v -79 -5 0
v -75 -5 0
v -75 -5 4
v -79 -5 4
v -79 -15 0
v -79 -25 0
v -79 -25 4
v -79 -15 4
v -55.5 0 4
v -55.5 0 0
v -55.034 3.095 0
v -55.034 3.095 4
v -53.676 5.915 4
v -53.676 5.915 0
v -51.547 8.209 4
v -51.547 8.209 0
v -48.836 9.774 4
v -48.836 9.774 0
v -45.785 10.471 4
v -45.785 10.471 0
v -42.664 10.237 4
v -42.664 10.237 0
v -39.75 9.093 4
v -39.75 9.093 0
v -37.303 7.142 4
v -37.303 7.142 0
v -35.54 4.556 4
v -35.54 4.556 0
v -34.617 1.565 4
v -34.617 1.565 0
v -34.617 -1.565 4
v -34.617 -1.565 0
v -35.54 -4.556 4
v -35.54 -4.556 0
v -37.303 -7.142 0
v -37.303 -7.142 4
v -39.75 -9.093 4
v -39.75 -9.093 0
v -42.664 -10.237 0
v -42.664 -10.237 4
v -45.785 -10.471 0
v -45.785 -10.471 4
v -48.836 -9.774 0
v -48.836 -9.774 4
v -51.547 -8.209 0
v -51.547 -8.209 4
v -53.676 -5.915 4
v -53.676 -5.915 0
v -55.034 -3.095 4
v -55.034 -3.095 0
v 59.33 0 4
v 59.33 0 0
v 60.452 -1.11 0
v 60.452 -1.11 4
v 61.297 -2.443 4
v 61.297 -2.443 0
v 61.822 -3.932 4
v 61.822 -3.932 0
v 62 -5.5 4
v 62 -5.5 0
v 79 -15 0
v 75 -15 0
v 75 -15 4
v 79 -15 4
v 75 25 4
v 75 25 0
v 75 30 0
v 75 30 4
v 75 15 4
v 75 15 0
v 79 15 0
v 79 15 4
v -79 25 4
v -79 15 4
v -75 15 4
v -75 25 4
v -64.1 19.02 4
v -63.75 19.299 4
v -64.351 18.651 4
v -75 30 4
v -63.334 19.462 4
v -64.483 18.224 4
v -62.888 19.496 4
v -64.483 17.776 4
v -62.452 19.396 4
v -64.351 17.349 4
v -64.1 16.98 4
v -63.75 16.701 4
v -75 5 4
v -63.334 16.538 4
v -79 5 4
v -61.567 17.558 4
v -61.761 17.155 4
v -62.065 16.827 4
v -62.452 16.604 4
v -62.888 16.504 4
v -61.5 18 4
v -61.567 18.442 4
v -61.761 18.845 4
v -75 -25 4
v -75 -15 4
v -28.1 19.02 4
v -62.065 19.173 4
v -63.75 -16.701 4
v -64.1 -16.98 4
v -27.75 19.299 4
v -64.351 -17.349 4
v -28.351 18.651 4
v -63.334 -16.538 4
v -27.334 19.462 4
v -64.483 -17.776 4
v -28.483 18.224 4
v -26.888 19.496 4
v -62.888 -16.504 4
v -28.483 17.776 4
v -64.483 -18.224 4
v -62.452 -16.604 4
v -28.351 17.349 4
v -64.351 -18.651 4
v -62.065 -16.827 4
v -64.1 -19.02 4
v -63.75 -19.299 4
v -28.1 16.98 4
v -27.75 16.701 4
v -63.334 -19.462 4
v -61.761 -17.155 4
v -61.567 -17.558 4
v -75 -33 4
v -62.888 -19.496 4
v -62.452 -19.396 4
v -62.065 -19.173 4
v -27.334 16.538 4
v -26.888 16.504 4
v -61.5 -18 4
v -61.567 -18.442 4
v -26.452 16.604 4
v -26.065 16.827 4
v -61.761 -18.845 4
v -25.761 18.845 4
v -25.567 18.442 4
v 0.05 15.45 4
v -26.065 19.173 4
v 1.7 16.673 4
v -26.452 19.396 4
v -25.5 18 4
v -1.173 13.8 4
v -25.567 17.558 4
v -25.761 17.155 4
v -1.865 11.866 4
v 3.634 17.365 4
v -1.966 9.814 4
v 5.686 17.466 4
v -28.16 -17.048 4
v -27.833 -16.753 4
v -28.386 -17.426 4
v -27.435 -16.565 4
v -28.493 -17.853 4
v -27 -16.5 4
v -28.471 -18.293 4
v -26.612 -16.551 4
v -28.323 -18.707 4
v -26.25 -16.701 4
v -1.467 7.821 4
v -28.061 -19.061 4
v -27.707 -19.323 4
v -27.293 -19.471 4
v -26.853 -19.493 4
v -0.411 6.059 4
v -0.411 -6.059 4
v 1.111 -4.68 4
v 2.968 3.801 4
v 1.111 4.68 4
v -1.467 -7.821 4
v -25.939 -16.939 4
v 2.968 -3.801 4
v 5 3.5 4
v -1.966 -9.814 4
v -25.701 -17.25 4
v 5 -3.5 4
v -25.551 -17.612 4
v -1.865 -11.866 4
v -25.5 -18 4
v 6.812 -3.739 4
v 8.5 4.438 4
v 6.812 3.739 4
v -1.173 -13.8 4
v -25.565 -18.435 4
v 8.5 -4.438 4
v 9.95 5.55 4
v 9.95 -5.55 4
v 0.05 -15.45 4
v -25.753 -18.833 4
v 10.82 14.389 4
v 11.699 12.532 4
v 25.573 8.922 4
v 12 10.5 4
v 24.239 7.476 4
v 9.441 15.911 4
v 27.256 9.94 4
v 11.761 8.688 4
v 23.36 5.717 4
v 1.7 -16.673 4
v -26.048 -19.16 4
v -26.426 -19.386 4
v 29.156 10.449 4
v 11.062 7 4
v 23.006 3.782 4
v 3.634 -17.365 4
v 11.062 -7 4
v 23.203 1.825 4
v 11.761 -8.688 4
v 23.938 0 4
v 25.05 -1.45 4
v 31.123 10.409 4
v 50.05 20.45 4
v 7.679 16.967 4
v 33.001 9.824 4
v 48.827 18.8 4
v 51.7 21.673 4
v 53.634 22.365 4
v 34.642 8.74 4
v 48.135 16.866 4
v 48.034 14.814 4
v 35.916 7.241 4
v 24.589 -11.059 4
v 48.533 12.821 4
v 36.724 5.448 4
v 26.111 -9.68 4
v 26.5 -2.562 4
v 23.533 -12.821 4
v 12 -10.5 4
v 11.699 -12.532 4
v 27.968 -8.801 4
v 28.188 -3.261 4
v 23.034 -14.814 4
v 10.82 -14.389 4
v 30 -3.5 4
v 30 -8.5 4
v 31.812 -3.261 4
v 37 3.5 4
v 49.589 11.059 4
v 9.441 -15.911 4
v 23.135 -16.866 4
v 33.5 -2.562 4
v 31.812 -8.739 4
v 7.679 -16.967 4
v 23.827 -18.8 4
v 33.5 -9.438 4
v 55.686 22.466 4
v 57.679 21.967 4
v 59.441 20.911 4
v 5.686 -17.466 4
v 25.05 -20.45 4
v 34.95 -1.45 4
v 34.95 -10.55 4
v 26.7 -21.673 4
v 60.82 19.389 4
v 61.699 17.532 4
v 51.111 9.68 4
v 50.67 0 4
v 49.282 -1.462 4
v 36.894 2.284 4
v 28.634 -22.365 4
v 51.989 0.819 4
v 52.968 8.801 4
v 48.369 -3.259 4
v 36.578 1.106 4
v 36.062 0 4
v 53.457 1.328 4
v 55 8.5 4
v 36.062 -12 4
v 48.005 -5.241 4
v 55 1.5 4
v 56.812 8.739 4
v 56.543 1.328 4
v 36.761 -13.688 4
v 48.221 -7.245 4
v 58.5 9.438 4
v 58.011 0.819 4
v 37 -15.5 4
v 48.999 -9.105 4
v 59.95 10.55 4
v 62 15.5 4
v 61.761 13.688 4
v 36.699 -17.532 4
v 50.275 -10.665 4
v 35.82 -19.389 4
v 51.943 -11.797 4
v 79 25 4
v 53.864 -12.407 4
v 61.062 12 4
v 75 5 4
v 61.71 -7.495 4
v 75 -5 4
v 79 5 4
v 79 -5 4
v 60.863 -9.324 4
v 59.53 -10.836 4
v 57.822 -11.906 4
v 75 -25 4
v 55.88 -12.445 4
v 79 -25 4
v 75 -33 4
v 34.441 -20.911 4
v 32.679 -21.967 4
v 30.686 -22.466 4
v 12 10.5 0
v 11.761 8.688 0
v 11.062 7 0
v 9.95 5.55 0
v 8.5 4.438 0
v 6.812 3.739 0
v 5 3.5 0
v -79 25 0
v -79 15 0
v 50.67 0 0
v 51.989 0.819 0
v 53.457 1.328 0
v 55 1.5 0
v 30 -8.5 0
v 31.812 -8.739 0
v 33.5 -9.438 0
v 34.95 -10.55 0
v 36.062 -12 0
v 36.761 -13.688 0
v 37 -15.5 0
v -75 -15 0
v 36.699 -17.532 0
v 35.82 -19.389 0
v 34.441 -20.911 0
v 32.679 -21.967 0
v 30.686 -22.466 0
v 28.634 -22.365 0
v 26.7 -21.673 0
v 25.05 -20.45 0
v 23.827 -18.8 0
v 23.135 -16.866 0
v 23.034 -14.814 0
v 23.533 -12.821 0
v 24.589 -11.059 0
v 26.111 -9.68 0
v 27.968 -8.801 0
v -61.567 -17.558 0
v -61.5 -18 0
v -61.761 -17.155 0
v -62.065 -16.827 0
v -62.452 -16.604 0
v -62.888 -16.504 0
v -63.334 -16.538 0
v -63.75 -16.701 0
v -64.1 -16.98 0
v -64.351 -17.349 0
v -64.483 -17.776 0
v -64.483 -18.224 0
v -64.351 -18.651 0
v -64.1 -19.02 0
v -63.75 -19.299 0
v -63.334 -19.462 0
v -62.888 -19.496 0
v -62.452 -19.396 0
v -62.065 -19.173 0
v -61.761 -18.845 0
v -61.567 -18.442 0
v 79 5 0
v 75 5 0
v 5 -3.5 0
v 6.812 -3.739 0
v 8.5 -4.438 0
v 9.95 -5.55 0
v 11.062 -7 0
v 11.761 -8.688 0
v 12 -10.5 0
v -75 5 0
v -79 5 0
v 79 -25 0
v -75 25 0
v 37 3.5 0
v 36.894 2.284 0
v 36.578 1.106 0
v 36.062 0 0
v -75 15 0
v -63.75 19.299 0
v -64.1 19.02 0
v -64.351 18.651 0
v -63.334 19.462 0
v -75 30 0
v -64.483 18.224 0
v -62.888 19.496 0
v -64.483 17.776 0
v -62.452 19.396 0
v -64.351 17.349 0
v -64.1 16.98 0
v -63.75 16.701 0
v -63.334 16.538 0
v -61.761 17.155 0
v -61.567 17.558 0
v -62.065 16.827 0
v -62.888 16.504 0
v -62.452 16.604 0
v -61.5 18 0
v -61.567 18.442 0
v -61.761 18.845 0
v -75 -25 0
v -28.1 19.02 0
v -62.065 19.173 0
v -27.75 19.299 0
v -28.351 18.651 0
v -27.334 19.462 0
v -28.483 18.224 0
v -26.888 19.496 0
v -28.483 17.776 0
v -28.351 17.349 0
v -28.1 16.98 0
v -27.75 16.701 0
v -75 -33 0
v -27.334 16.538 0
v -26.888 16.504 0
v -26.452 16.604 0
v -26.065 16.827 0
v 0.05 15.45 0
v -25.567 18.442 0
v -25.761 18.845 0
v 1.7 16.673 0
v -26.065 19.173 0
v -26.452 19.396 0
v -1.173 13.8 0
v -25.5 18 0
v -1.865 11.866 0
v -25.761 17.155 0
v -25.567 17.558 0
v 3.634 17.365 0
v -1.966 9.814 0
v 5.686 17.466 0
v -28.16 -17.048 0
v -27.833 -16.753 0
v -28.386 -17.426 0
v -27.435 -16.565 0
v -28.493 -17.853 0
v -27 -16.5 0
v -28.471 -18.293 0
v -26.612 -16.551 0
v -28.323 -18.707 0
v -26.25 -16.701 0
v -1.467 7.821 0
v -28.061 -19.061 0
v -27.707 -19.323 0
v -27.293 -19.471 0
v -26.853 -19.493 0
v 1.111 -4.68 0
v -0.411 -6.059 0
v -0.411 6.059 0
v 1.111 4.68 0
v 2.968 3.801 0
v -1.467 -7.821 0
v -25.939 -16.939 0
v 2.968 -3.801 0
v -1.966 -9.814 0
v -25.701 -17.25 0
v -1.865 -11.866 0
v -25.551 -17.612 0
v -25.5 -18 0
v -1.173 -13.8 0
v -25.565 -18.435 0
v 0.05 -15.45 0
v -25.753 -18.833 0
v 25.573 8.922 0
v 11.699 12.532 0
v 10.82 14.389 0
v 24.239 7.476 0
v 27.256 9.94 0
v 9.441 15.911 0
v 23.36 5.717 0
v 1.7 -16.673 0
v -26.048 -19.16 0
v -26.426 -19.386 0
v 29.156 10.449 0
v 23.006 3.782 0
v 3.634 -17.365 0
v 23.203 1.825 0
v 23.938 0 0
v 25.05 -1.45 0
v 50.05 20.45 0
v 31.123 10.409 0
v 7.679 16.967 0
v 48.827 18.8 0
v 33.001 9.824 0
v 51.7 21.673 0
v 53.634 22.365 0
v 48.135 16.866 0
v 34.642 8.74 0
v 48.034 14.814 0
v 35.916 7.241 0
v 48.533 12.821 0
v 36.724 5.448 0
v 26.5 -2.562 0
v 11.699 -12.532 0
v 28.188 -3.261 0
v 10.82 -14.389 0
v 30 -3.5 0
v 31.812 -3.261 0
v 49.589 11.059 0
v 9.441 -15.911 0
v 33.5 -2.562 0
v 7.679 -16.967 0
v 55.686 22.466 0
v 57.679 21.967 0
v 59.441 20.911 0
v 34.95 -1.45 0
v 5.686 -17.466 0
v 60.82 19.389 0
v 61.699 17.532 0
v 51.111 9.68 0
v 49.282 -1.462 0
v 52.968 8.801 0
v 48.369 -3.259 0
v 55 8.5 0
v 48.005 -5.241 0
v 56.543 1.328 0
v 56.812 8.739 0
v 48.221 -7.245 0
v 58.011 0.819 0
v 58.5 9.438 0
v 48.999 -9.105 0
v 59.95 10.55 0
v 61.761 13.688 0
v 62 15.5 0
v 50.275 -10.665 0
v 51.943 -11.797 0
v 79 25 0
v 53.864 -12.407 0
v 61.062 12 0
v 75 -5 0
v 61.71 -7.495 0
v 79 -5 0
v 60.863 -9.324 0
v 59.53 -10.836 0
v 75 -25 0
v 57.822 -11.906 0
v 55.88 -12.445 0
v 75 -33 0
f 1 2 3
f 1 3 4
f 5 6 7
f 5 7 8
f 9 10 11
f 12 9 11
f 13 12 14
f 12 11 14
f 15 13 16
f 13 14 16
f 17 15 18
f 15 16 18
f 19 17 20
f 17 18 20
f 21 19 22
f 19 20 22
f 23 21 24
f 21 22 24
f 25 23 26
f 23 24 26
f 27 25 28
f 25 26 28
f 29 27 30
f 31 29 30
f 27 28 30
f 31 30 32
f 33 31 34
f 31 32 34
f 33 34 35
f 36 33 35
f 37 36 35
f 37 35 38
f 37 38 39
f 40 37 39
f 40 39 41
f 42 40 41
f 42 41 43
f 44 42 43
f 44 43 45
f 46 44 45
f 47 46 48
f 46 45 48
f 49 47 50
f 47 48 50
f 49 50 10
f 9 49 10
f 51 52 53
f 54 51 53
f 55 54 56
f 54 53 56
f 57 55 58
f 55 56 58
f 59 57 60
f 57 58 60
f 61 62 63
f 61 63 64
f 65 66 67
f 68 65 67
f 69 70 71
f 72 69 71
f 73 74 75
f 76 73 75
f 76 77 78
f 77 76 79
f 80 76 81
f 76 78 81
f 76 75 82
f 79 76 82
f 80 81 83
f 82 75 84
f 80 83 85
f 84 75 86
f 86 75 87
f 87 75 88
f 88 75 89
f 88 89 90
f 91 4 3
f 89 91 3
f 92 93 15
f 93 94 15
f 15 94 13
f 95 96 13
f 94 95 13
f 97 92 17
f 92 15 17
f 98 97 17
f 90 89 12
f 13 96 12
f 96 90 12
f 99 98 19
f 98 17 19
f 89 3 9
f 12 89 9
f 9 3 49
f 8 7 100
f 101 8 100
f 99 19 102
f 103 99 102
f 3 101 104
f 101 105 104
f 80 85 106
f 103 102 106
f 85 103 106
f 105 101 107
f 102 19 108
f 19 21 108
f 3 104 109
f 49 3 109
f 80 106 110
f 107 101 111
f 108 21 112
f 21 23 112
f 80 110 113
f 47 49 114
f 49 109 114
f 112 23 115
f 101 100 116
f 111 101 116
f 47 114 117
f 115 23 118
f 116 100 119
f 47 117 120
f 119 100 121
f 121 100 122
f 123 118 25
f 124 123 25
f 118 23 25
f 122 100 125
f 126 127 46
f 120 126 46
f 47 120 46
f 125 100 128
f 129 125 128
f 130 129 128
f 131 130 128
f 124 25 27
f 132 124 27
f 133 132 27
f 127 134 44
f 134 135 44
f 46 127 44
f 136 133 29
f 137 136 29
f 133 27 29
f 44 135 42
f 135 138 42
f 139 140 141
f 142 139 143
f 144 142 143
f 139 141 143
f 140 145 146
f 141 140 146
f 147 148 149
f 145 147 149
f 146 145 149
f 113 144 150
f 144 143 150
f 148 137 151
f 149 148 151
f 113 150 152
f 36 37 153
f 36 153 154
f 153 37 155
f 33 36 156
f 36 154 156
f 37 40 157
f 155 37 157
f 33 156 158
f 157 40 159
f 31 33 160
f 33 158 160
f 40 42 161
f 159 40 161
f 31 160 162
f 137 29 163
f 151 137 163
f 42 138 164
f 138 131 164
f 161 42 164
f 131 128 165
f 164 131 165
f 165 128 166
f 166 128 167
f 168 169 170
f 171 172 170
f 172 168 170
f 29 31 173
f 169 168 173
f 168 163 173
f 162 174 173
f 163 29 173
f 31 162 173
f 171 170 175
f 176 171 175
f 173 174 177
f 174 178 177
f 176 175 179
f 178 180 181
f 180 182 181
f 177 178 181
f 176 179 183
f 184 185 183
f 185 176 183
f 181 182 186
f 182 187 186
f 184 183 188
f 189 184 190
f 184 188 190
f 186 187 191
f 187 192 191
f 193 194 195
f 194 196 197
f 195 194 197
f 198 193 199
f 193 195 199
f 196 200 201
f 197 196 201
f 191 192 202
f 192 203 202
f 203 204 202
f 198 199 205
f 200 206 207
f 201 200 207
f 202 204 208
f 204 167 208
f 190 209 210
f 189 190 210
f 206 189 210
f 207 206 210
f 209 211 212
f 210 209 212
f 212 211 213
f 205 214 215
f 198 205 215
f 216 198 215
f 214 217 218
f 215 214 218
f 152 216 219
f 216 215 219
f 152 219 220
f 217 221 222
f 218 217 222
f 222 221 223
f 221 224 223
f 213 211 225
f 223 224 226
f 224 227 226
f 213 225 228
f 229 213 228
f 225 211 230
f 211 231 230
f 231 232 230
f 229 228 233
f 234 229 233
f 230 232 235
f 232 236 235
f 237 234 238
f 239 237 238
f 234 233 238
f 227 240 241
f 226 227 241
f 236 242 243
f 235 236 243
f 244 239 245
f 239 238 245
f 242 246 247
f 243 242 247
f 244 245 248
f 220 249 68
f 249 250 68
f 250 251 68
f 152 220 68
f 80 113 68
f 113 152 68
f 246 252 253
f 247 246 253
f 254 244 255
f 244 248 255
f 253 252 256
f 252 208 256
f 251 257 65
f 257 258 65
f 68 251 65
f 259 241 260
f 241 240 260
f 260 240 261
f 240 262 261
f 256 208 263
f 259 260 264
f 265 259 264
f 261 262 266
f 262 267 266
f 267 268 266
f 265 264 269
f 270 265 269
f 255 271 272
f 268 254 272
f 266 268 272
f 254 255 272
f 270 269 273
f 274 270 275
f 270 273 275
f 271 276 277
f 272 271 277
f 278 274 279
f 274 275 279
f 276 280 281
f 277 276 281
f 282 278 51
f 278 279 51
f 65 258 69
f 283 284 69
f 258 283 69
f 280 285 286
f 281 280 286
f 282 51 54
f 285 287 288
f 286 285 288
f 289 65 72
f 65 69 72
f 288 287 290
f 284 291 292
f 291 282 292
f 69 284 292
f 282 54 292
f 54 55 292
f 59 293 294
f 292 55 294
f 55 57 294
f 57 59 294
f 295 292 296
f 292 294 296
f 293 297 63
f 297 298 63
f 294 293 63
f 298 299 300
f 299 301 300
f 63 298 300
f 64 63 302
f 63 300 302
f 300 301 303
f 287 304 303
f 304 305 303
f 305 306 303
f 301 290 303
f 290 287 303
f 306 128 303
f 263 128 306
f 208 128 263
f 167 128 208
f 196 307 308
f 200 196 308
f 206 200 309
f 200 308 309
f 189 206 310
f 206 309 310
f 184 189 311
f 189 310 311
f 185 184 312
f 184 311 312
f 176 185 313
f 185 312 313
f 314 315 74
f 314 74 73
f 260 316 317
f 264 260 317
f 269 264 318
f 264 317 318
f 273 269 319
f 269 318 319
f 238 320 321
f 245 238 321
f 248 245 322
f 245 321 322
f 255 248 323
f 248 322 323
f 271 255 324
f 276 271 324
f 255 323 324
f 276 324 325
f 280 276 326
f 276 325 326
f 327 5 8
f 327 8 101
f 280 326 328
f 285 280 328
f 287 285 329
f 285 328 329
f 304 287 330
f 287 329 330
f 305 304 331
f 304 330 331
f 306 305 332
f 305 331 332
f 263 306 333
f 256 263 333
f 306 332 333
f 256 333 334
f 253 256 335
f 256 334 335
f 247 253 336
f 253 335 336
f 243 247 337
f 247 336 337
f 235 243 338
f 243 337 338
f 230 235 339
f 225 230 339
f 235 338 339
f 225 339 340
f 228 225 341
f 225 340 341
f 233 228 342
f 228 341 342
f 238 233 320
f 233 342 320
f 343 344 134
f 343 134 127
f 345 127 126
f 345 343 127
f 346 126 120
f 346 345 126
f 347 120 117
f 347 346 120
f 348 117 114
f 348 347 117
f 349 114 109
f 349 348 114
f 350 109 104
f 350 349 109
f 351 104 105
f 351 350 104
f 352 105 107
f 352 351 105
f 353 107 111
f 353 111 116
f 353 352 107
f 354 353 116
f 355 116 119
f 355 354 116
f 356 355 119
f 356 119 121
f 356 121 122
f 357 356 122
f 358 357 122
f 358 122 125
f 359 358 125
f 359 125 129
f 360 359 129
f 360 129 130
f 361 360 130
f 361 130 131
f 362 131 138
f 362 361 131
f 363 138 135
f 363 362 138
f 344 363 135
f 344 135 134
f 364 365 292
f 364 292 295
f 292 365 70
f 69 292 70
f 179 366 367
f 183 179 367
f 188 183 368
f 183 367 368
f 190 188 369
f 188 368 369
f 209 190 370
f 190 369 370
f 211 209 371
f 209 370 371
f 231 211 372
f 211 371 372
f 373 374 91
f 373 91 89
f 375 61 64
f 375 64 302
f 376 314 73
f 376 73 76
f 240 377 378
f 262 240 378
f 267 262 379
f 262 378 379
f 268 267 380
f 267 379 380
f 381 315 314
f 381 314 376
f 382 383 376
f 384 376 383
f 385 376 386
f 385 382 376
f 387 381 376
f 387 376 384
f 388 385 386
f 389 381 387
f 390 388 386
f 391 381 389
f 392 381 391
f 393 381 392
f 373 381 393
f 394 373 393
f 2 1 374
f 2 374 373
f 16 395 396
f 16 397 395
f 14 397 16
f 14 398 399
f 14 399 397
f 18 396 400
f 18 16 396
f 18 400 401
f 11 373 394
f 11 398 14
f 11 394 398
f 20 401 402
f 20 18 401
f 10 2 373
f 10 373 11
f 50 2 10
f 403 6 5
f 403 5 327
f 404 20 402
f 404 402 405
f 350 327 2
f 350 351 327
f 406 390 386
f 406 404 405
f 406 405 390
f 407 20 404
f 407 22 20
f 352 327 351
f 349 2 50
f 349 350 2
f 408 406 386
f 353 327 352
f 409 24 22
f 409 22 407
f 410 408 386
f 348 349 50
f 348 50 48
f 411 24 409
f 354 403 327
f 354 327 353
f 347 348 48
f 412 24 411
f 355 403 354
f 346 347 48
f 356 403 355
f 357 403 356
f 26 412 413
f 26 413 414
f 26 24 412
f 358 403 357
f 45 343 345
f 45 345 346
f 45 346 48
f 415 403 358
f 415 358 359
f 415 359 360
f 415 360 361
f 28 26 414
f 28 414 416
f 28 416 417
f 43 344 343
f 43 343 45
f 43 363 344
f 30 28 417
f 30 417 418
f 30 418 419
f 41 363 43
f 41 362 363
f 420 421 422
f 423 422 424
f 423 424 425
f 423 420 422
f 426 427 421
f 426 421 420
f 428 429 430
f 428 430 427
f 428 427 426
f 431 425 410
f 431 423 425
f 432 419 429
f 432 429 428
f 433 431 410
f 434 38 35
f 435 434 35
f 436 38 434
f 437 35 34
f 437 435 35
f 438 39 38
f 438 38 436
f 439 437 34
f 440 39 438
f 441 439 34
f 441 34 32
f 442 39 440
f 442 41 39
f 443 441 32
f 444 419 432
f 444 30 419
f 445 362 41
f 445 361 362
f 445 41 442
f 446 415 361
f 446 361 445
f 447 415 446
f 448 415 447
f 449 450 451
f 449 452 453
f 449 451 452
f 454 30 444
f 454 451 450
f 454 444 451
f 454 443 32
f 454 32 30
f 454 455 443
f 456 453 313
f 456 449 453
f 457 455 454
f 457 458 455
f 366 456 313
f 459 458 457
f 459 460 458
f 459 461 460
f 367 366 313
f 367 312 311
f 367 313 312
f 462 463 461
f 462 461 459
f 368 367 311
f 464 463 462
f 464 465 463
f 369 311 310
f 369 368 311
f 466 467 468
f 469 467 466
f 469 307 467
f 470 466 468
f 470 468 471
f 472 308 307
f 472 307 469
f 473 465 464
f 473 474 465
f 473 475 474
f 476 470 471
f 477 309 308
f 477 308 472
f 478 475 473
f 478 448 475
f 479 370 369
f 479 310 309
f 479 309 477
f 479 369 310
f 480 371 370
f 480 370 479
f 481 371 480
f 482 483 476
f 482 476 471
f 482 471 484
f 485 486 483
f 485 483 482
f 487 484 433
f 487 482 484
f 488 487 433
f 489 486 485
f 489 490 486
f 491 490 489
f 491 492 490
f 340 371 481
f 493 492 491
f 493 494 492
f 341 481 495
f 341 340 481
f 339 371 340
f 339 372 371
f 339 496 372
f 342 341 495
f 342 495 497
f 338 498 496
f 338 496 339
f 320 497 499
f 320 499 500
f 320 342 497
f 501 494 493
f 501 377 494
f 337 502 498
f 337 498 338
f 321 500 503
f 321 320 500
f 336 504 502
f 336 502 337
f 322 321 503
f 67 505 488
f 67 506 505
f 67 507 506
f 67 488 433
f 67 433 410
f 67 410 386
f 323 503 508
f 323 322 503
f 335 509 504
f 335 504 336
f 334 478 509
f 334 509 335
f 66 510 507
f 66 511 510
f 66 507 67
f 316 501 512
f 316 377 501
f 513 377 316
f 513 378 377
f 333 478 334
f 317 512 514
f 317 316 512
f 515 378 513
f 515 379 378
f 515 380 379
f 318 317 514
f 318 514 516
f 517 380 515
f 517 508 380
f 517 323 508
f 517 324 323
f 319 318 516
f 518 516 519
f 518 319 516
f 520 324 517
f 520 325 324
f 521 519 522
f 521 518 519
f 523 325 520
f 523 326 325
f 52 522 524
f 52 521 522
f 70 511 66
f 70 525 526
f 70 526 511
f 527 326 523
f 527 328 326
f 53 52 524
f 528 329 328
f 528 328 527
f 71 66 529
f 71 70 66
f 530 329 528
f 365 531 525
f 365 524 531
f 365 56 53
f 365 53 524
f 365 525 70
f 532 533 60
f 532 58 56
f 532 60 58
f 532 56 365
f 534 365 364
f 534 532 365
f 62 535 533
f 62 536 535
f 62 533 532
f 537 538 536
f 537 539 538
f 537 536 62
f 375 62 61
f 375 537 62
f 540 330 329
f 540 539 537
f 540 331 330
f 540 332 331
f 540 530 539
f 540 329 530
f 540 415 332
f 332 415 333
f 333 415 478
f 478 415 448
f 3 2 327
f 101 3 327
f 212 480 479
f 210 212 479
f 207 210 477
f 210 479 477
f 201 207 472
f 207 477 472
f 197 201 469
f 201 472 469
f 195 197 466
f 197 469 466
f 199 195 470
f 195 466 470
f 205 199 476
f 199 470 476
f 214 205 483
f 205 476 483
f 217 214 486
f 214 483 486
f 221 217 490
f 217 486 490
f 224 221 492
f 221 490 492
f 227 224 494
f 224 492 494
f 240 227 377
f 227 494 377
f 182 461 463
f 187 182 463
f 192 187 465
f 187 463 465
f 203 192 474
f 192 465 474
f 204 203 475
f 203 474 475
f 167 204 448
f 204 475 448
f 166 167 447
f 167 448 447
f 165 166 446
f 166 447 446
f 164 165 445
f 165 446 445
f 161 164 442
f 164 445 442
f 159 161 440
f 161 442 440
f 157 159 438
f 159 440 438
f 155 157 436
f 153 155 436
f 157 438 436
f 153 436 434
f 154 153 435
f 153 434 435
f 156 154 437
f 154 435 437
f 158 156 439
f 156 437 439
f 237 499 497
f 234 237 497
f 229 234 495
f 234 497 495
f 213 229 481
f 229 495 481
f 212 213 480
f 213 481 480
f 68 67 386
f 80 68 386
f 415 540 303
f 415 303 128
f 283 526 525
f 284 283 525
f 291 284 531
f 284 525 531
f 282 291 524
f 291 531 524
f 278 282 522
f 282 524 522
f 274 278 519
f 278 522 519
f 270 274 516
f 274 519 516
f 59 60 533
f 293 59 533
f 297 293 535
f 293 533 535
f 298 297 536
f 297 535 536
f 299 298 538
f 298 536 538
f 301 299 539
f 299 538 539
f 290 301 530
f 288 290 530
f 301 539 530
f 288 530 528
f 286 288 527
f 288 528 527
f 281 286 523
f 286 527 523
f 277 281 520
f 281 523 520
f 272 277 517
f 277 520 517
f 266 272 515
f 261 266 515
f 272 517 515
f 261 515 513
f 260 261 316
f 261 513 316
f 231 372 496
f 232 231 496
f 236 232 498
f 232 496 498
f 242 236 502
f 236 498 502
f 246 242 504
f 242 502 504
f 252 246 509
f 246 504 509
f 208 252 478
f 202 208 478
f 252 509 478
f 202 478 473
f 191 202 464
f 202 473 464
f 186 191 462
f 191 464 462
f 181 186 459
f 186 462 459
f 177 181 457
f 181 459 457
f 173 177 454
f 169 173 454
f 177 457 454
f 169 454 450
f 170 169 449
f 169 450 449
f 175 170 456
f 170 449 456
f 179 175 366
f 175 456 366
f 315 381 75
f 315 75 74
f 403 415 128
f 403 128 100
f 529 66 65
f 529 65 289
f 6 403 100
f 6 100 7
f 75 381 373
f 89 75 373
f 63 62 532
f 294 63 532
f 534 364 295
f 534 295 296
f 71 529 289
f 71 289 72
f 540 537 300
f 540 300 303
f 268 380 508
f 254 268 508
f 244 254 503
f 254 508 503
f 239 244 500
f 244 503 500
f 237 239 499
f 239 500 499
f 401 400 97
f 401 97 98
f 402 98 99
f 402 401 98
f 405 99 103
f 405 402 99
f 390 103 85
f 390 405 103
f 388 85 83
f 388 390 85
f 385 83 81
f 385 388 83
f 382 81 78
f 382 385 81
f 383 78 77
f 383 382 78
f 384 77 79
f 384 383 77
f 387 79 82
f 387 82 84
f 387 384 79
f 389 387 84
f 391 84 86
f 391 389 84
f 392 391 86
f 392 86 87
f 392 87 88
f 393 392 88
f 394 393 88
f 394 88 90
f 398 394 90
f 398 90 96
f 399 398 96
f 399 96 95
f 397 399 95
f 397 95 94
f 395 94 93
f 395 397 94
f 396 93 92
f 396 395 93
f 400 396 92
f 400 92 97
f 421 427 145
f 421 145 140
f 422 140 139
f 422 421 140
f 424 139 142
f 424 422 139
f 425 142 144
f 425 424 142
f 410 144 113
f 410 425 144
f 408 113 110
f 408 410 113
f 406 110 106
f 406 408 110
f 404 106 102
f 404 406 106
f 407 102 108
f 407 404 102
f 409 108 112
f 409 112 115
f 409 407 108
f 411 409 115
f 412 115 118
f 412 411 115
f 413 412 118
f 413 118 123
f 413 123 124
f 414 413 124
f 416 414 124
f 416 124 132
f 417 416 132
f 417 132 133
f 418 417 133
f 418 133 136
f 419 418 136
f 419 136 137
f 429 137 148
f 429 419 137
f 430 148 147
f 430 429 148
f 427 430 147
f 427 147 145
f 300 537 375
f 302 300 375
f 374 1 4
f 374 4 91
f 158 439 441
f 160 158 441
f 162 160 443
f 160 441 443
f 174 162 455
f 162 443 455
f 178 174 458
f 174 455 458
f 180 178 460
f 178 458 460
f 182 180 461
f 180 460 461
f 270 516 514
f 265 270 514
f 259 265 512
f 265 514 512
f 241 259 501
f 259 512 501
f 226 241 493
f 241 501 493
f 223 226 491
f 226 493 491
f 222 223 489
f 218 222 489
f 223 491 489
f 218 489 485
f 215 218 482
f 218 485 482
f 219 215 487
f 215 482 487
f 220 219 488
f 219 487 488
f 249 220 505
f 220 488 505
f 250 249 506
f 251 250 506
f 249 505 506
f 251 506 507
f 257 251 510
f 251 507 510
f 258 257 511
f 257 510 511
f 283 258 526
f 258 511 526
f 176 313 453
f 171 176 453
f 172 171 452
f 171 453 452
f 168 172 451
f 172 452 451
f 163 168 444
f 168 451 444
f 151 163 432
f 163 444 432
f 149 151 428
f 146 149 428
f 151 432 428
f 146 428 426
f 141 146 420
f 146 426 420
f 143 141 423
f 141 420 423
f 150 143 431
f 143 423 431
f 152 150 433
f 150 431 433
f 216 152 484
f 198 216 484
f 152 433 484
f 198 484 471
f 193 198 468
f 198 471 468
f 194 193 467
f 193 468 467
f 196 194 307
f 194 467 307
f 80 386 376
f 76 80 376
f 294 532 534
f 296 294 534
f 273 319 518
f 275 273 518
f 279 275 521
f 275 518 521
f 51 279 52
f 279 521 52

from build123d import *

# Parameters (mm, degrees)
F0_R     = 1.5
F1_DEPTH = 4
F3_DEPTH = 25
F4_W     = 4
F4_H     = 10
F5_DEPTH = 4


with BuildPart() as f1:
    # F0 (on Top) → F1 (new body)
    with BuildSketch(Plane.XY):
        with BuildLine():
            ThreePointArc((-25.5, -18), (-25.93934, -16.93934), (-27, -16.5))
            ThreePointArc((-27, -16.5), (-28.06066, -19.06066), (-25.5, -18))
        make_face()
        with BuildLine():
            Line((-45, 0), (-55.5, 0))
            ThreePointArc((-55.5, 0), (-45, -10.5), (-34.5, 0))
            Line((-34.5, 0), (-45, 0))
        make_face()
        Polygon((-75, -30), (75, -30), (75, 30), (-75, 30), (-75, 0), align=None)
        with Locations((-63, -18)):
            Circle(F0_R, mode=Mode.SUBTRACT)
        with BuildLine():
            ThreePointArc((-25.5, -18), (-28.06066, -19.06066), (-27, -16.5))
            ThreePointArc((-27, -16.5), (-25.93934, -16.93934), (-25.5, -18))
        make_face(mode=Mode.SUBTRACT)
        with BuildLine():
            ThreePointArc((-34.5, 0), (-45, -10.5), (-55.5, 0))
            ThreePointArc((-55.5, 0), (-45, 10.5), (-34.5, 0))
        make_face(mode=Mode.SUBTRACT)
        with Locations((-63, 18)):
            Circle(F0_R, mode=Mode.SUBTRACT)
        with Locations((-27, 18)):
            Circle(F0_R, mode=Mode.SUBTRACT)
    extrude(amount=F1_DEPTH)

    # F2 (on face) → F3 (cut)
    with BuildSketch(Plane(origin=(0, 0, 0), x_dir=(1, 0, 0), z_dir=(0, 0, -1))):
        with BuildLine():
            ThreePointArc((55, -1.5), (57.291288, -1.114378), (59.330127, 0))
            Line((59.330127, 0), (55, 0))
            Line((55, 0), (55, -1.5))
        make_face()
        with BuildLine():
            ThreePointArc((62, -15.5), (59.949747, -10.550253), (55, -8.5))
            ThreePointArc((55, -8.5), (50.050253, -20.449747), (62, -15.5))
        make_face()
        with BuildLine():
            ThreePointArc((12, -10.5), (9.949747, -5.550253), (5, -3.5))
            ThreePointArc((5, -3.5), (0.050253, -15.449747), (12, -10.5))
        make_face()
        with BuildLine():
            ThreePointArc((12, 10.5), (0.050253, 15.449747), (5, 3.5))
            ThreePointArc((5, 3.5), (9.949747, 5.550253), (12, 10.5))
        make_face()
        with BuildLine():
            ThreePointArc((37, 15.5), (25.050253, 20.449747), (30, 8.5))
            ThreePointArc((30, 8.5), (34.949747, 10.550253), (37, 15.5))
        make_face()
        with BuildLine():
            ThreePointArc((37, -3.5), (36.761481, -1.688267), (36.062178, 0))
            Line((36.062178, 0), (30, 0))
            Line((30, 0), (23.937822, 0))
            ThreePointArc((23.937822, 0), (28.188267, -10.261481), (37, -3.5))
        make_face()
        with BuildLine():
            Line((30, 0), (36.062178, 0))
            ThreePointArc((36.062178, 0), (33.5, 2.562178), (30, 3.5))
            Line((30, 3.5), (30, 0))
        make_face()
        with BuildLine():
            Line((55, 0), (59.330127, 0))
            ThreePointArc((59.330127, 0), (61.297257, 2.443113), (62, 5.5))
            ThreePointArc((62, 5.5), (51.943113, 11.797257), (50.669873, 0))
            Line((50.669873, 0), (55, 0))
        make_face()
        with BuildLine():
            Line((55, -1.5), (55, 0))
            Line((55, 0), (50.669873, 0))
            ThreePointArc((50.669873, 0), (52.708712, -1.114378), (55, -1.5))
        make_face()
        with BuildLine():
            Line((23.937822, 0), (30, 0))
            Line((30, 0), (30, 3.5))
            ThreePointArc((30, 3.5), (26.5, 2.562178), (23.937822, 0))
        make_face()
    extrude(amount=-F3_DEPTH, mode=Mode.SUBTRACT)

    # F4 (on face) → F5 (join)
    with BuildSketch(Plane(origin=(0, 0, 0), x_dir=(1, 0, 0), z_dir=(0, 0, -1))):
        Polygon((-75, -5), (-75, 0), (-75, 5), (-79, 5), (-79, -5), align=None)
        Polygon((-75, 20), (-75, 25), (-79, 25), (-79, 15), (-75, 15), align=None)
        Polygon((-75, -15), (-79, -15), (-79, -25), (-75, -25), (-75, -20), align=None)
        with Locations((77, 0)):
            Rectangle(F4_W, F4_H)
        with Locations((77, -20)):
            Rectangle(F4_W, F4_H)
        with Locations((77, 20)):
            Rectangle(F4_W, F4_H)
        Polygon((-75, 33), (-75, 30), (0, 30), (75, 30), (75, 33), align=None)
    extrude(amount=-F5_DEPTH)


solid = f1.part
